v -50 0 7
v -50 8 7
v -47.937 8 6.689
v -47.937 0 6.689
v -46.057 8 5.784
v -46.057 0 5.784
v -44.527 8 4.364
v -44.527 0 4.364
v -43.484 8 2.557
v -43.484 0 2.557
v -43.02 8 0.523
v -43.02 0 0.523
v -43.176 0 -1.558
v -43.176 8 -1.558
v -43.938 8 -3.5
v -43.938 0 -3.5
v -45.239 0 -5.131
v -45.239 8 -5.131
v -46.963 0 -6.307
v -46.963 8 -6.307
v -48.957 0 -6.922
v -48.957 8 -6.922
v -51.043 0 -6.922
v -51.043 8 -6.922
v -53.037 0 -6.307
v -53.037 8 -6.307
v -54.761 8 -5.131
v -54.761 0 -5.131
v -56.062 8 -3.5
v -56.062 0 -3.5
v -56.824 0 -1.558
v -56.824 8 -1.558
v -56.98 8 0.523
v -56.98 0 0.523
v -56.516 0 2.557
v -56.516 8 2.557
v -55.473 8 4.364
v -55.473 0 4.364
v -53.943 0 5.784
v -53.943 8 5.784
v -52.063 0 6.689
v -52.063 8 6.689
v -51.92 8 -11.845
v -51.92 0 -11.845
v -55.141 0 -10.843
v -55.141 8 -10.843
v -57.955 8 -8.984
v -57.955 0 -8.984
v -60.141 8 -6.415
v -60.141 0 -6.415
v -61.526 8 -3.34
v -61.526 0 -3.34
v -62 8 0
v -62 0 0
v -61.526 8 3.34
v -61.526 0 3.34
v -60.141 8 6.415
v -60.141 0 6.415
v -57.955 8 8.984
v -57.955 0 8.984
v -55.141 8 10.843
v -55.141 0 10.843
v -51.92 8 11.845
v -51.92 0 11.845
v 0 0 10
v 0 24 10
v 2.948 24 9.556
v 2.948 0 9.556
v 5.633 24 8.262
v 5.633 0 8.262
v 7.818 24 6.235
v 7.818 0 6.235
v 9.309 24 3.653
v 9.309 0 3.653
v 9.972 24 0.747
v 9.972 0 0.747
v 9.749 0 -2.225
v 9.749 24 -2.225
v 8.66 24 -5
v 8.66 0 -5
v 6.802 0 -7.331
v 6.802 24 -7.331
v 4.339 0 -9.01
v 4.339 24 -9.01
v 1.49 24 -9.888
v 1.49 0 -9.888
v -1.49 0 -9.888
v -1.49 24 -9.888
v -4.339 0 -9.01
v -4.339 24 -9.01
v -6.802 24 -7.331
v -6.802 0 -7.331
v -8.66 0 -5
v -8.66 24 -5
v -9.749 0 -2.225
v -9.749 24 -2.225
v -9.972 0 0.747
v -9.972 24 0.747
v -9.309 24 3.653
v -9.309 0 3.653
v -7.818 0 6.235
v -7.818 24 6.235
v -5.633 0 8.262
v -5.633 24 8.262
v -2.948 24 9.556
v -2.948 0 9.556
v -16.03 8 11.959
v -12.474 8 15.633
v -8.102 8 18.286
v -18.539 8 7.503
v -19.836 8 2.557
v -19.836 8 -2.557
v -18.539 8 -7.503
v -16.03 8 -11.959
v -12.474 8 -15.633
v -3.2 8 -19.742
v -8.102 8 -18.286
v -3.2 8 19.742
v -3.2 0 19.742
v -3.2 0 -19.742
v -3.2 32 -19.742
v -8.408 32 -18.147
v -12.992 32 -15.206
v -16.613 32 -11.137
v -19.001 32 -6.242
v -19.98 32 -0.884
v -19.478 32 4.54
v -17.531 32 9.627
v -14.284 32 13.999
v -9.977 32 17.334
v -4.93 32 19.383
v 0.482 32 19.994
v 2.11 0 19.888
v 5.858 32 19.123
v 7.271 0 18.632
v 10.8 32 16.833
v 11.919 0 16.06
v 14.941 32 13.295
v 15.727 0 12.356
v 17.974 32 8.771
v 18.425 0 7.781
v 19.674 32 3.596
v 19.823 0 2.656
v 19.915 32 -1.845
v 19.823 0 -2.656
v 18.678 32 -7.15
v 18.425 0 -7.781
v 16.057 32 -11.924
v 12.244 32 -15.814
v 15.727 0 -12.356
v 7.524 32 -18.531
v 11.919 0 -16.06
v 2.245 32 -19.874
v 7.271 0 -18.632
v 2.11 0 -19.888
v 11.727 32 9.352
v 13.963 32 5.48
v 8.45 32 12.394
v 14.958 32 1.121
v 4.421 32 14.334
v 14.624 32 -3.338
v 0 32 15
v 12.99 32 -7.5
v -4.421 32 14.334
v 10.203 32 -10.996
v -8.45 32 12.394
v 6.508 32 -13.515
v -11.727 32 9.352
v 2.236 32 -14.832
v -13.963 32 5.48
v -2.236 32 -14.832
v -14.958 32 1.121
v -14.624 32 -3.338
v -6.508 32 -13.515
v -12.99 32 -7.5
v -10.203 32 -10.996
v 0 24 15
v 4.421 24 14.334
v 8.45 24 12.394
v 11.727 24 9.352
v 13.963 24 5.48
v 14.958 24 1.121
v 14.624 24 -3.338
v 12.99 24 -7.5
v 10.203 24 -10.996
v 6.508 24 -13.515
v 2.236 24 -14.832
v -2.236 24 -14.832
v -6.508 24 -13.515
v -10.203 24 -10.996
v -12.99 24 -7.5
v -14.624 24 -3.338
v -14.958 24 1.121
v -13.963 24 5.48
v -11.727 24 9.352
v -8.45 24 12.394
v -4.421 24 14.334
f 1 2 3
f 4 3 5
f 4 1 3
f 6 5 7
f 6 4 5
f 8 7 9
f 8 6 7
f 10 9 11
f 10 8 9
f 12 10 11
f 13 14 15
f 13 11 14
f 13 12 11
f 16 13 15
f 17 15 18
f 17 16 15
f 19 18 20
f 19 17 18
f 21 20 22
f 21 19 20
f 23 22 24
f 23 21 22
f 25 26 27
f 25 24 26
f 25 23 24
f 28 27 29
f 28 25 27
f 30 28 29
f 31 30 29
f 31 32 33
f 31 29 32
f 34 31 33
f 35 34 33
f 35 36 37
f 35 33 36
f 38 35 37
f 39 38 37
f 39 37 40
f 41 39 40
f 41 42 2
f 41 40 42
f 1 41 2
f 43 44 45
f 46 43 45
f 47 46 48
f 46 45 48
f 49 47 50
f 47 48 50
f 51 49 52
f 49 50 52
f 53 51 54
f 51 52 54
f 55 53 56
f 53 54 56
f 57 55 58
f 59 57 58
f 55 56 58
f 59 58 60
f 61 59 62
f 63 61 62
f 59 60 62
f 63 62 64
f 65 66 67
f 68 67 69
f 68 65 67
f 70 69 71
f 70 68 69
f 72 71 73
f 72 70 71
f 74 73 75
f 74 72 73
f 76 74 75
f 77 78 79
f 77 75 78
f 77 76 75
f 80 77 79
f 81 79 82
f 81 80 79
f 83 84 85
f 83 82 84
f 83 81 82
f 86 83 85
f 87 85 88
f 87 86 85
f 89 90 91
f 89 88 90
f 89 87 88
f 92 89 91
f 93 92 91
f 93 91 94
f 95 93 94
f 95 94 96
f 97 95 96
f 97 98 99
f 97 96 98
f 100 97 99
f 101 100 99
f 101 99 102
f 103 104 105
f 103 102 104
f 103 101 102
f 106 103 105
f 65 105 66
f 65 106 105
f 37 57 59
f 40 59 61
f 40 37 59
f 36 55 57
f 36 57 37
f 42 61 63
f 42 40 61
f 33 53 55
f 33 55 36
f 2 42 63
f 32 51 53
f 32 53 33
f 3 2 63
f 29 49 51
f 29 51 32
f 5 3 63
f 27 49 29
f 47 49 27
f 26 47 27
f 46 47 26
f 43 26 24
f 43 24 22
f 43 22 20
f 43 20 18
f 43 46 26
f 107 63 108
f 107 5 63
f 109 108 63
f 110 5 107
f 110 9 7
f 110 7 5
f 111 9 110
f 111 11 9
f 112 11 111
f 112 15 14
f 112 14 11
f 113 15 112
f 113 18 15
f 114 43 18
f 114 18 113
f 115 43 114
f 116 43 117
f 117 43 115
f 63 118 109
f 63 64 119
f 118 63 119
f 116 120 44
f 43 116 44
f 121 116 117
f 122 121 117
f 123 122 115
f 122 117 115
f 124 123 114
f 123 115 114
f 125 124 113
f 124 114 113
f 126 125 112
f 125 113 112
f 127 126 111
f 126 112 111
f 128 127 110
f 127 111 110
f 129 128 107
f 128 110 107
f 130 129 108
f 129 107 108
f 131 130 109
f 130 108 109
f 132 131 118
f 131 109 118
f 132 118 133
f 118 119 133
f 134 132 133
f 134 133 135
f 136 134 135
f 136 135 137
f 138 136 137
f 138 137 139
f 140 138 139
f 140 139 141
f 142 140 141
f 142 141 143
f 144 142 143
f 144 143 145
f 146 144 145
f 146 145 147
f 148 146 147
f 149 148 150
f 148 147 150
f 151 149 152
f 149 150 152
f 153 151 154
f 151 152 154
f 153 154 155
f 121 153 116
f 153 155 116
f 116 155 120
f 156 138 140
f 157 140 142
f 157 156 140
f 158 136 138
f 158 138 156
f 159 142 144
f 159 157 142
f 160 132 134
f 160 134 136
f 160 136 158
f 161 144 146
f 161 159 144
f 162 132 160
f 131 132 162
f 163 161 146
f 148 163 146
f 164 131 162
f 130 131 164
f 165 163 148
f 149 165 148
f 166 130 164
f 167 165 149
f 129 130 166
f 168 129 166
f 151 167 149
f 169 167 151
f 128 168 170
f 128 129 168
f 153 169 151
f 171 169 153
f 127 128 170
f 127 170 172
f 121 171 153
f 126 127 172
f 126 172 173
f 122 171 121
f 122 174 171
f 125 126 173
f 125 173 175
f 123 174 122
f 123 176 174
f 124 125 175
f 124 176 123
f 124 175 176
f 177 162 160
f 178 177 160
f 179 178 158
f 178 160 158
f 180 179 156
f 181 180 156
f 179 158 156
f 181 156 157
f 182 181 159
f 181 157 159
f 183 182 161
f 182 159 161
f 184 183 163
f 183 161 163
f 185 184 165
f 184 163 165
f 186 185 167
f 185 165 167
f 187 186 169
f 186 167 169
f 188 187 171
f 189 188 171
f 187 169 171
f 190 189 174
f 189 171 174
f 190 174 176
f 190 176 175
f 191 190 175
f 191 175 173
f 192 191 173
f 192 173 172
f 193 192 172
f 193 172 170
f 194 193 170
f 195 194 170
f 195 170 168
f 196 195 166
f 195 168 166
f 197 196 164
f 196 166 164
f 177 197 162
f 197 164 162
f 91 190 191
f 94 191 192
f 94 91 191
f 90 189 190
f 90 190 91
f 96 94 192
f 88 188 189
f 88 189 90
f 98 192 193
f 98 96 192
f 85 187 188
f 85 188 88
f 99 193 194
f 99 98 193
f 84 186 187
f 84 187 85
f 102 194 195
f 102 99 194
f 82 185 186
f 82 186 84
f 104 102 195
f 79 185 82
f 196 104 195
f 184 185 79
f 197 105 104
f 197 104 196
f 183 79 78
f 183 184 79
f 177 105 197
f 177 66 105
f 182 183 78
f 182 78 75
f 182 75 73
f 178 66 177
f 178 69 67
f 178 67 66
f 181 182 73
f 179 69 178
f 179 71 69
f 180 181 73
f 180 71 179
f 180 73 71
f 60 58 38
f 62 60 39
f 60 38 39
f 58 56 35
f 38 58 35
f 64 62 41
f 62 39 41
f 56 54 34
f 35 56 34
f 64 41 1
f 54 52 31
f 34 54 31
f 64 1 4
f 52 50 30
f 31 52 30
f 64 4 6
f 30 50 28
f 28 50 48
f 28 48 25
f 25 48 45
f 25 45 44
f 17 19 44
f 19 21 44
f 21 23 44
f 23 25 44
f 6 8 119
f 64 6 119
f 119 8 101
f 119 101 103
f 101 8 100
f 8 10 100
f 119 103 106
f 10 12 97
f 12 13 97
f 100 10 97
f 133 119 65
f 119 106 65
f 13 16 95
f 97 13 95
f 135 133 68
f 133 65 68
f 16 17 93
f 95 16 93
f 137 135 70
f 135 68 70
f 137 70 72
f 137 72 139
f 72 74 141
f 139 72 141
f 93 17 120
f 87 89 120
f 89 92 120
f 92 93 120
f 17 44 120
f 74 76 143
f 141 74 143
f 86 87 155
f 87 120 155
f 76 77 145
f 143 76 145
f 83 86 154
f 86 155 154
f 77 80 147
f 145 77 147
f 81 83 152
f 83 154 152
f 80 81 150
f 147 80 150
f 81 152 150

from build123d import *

# Parameters (mm, degrees)
EXTRUDE_3_DEPTH     = 8
SKETCH_5_R          = 20
EXTRUDE_4_DEPTH     = 32
SKETCH_7_R          = 15
CUT_EXTRUDE_1_DEPTH = 8
SKETCH_8_R          = 10
CUT_EXTRUDE_2_DEPTH = 38
SKETCH_9_R          = 7
CUT_EXTRUDE_4_DEPTH = 18


with BuildPart() as part:
    # 草图2 → 凸台-拉伸3 (new body)
    with BuildSketch(Plane(origin=(0, 0, 0), x_dir=(1, 0, 0), z_dir=(0, 1, 0))):
        with BuildLine():
            Line((-3.2, 19.742340287), (-51.92, 11.845404172))
            ThreePointArc((-51.92, 11.845404172), (-62, 0), (-51.92, -11.845404172))
            Line((-51.92, -11.845404172), (-3.2, -19.742340287))
            ThreePointArc((-3.2, -19.742340287), (20, 0), (-3.2, 19.742340287))
        make_face()
    extrude(amount=EXTRUDE_3_DEPTH)

    # 草图5 → 凸台-拉伸4 (add)
    with BuildSketch(Plane(origin=(0, 0, 0), x_dir=(1, 0, 0), z_dir=(0, 1, 0))):
        with Locations(Location((0, 0, 0), (0, 0, 99.206896221))):
            Circle(SKETCH_5_R)
    extrude(amount=EXTRUDE_4_DEPTH)

    # 草图7 → 切除-拉伸1 (cut)
    with BuildSketch(Plane(origin=(0, 32, 0), x_dir=(1, 0, 0), z_dir=(0, 1, 0))):
        with Locations(Location((0, 0, 0), (0, 0, 270))):
            Circle(SKETCH_7_R)
    extrude(amount=-CUT_EXTRUDE_1_DEPTH, mode=Mode.SUBTRACT)

    # 草图8 → 切除-拉伸2 (cut)
    with BuildSketch(Plane(origin=(0, 0, 0), x_dir=(1, 0, 0), z_dir=(0, 1, 0))):
        with Locations(Location((0, 0, 0), (0, 0, 270))):
            Circle(SKETCH_8_R)
    extrude(amount=CUT_EXTRUDE_2_DEPTH, mode=Mode.SUBTRACT)

    # 草图9 → 切除-拉伸4 (cut)
    with BuildSketch(Plane(origin=(0, 0, 0), x_dir=(1, 0, 0), z_dir=(0, 1, 0))):
        with Locations(Location((-50, 0, 0), (0, 0, 270))):
            Circle(SKETCH_9_R)
    extrude(amount=CUT_EXTRUDE_4_DEPTH, mode=Mode.SUBTRACT)


solid = part.part
